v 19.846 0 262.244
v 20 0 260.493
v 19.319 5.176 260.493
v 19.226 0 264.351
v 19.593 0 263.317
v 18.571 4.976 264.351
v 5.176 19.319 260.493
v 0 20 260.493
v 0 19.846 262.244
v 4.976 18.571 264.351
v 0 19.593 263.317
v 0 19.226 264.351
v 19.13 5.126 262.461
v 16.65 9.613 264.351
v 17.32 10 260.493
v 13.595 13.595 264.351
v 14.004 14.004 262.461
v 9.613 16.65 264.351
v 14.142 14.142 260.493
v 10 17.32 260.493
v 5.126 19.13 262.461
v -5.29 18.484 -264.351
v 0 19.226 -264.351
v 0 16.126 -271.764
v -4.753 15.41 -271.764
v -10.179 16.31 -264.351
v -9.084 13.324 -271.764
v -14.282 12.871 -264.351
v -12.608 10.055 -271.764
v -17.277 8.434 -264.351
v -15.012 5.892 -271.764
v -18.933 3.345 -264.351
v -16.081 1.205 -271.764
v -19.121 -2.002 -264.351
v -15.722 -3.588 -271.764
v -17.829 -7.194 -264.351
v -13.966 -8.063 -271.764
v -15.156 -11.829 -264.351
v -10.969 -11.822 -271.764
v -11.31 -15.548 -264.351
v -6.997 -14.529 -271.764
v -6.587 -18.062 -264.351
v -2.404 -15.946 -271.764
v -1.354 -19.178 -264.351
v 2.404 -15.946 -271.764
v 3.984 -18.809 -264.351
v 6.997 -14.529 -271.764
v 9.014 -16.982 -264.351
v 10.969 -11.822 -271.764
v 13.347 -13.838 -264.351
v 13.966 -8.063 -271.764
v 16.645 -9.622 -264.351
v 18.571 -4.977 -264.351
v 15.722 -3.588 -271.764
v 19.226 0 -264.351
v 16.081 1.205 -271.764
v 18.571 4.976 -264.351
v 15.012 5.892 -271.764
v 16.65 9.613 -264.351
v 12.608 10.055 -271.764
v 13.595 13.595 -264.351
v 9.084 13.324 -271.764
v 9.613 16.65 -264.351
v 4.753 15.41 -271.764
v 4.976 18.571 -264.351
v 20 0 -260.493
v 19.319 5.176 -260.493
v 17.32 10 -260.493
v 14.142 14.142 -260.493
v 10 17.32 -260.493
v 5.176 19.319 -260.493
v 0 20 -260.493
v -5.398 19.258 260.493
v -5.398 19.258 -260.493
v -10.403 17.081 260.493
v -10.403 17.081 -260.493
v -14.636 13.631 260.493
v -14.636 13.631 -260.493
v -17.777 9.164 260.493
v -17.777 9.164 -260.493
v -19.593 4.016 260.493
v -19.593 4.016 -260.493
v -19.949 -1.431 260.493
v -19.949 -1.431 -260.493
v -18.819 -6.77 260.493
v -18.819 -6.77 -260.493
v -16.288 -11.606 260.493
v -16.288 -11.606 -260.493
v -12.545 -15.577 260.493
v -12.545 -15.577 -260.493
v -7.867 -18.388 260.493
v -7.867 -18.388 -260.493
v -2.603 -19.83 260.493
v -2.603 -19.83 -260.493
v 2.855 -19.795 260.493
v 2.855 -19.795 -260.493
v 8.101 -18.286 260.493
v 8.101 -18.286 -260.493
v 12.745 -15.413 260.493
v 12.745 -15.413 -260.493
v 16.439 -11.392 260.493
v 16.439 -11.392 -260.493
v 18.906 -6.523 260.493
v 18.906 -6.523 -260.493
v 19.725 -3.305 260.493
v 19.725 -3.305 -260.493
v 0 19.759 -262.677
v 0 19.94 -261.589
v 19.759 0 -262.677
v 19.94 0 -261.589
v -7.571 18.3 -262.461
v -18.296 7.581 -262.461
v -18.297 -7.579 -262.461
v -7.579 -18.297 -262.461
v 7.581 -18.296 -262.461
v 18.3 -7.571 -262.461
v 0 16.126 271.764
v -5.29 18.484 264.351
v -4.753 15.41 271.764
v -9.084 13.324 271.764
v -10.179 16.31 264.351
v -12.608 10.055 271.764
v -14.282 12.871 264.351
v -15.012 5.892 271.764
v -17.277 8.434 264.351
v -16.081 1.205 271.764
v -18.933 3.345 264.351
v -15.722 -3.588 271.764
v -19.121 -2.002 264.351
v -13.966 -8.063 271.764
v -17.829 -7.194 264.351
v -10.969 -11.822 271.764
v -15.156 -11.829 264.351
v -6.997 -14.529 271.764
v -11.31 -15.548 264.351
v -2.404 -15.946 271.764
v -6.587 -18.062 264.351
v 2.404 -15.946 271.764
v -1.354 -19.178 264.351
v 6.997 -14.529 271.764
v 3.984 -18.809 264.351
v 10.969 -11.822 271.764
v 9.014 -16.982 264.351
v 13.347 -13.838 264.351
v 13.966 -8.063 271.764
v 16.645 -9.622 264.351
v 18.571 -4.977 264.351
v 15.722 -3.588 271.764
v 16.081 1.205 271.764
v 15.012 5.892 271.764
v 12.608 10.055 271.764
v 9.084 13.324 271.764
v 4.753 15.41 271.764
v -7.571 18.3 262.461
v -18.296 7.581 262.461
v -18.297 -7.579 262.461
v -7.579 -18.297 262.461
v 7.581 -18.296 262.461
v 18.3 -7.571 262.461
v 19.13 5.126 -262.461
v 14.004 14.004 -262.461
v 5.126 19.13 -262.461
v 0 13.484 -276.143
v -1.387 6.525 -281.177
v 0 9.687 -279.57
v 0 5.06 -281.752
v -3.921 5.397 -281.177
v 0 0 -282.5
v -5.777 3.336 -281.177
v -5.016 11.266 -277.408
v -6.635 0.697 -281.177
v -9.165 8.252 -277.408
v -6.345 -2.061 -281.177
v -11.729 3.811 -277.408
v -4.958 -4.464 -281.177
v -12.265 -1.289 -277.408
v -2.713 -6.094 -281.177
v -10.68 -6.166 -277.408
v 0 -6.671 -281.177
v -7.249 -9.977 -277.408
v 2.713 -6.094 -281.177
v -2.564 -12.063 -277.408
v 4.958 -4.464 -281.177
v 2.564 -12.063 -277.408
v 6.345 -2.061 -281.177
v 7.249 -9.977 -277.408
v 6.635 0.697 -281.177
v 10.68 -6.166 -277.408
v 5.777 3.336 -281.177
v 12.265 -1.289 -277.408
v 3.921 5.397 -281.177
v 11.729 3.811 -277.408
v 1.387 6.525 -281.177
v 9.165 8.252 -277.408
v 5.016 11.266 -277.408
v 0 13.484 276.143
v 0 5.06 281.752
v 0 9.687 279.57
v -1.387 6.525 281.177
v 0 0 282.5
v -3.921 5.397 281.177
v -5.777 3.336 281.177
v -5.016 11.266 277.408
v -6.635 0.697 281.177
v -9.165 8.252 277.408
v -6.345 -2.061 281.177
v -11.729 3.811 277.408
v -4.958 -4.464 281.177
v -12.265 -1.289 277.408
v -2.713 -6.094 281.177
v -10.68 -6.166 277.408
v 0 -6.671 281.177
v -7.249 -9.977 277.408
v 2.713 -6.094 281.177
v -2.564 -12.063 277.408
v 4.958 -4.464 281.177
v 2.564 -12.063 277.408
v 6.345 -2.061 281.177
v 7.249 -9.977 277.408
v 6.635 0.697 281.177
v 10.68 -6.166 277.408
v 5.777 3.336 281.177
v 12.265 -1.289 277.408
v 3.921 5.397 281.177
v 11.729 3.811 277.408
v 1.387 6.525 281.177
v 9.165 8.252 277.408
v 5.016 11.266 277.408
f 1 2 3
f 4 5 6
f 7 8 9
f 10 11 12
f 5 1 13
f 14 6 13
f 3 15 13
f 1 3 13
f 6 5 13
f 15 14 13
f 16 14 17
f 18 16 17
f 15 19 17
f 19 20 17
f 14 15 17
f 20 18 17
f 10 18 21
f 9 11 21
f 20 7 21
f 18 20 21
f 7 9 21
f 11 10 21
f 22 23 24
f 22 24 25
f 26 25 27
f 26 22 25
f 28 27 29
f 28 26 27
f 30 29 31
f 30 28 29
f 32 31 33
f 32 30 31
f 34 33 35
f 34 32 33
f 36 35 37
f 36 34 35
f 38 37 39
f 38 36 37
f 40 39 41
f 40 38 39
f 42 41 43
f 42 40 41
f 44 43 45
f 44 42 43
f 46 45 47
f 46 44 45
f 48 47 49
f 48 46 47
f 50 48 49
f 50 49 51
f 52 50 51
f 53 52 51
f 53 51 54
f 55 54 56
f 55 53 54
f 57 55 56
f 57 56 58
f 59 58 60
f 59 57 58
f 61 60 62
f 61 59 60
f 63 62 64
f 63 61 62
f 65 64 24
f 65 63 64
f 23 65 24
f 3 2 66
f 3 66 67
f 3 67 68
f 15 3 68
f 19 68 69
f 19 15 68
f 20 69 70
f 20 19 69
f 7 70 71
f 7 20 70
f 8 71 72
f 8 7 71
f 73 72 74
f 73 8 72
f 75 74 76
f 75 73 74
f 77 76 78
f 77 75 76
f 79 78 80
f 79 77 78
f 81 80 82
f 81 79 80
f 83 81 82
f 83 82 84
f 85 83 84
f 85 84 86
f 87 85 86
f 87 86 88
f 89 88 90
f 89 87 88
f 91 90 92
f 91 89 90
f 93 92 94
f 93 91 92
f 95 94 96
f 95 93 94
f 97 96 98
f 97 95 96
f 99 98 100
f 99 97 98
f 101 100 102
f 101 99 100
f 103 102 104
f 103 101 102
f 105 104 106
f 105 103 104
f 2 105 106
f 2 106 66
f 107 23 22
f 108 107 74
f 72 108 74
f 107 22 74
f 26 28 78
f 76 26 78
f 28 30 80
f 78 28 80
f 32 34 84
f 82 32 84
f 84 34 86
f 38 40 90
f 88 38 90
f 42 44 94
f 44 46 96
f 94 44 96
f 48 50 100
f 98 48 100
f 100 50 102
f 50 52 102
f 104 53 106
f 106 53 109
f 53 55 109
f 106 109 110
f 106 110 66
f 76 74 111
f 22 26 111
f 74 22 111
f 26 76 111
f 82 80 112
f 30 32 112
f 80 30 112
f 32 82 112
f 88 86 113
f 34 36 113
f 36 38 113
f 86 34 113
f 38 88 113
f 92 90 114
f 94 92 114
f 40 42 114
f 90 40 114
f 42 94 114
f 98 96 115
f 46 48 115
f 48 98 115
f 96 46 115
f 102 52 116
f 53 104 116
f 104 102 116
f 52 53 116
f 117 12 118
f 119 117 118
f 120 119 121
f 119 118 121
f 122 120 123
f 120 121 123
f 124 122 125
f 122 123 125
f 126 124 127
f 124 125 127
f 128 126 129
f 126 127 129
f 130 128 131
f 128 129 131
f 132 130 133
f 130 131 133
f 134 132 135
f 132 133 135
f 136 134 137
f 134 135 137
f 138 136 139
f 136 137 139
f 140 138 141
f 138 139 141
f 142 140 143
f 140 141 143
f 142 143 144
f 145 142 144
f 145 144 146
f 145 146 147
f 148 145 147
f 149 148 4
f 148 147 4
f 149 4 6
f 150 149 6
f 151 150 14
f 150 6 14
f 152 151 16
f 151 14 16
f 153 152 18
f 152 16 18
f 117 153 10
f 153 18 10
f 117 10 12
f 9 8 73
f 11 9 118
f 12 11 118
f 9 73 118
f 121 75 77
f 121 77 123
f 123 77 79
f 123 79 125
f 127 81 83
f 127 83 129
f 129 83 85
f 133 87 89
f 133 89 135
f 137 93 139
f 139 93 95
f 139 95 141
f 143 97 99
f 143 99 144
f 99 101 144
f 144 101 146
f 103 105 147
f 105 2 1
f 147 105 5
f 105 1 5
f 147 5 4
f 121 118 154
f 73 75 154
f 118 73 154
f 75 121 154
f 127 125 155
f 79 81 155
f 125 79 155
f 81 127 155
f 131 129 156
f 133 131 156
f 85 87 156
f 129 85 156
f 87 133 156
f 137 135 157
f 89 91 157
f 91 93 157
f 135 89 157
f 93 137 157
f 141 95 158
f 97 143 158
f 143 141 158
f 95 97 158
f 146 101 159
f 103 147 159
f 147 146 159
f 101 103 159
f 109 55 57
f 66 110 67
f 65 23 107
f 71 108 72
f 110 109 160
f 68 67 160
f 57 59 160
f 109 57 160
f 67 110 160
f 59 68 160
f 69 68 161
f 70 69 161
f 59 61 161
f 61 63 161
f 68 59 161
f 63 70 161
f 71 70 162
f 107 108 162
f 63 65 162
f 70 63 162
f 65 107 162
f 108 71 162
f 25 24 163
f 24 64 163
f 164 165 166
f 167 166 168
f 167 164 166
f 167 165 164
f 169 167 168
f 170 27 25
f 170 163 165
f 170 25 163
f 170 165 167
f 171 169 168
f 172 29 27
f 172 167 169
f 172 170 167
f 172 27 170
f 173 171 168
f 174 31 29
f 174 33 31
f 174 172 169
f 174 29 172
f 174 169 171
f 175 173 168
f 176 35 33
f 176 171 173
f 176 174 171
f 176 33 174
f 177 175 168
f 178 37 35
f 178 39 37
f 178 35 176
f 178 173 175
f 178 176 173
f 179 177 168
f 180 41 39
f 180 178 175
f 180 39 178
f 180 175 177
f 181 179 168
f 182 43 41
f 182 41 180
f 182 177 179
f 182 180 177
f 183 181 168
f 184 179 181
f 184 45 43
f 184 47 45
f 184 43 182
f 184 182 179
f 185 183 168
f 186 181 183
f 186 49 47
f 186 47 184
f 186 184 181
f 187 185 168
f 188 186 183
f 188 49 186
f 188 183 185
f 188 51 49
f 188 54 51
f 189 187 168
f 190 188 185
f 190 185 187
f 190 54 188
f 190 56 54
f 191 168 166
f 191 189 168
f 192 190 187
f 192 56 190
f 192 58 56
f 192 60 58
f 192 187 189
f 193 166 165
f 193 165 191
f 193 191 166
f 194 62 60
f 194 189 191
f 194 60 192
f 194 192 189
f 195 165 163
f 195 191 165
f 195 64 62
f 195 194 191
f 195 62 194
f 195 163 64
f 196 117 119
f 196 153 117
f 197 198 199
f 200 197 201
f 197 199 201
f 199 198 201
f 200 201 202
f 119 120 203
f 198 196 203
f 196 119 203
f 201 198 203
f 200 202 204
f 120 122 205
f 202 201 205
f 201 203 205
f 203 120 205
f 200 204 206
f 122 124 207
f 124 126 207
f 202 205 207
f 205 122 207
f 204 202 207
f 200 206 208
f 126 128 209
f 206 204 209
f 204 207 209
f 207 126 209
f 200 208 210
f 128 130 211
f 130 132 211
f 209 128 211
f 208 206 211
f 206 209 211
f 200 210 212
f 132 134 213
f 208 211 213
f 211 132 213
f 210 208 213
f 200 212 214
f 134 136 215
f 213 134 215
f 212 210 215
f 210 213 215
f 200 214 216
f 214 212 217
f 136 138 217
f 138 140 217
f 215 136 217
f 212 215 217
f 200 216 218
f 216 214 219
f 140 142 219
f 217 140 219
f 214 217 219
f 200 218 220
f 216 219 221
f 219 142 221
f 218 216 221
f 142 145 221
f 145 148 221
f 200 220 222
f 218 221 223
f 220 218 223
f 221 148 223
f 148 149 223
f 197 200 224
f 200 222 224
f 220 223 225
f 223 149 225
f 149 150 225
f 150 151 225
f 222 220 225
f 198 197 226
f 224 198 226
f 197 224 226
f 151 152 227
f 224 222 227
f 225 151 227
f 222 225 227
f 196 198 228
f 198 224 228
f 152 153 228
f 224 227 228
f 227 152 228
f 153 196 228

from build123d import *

# Parameters (mm, degrees)
SKETCH1_R           = 20
BOSS_EXTRUDE1_DEPTH = 262.5
FILLET1_R           = 10


with BuildPart() as part:
    # Sketch1 → Boss-Extrude1 (new body, symmetric)
    with BuildSketch(Plane.XY):
        Circle(SKETCH1_R)
    extrude(amount=BOSS_EXTRUDE1_DEPTH, both=True)

    # Sketch2 → Revolve1 (revolve)
    with BuildSketch(Plane(origin=(0, 0, 0), x_dir=(0, 0, -1), z_dir=(1, 0, 0))):
        with BuildLine():
            Line((-262.5, 20), (-262.5, 0))
            Line((-262.5, 0), (-282.5, 0))
            ThreePointArc((-282.5, 0), (-279.57043003, 9.686707526), (-271.763715382, 16.126419422))
            Line((-271.763715382, 16.126419422), (-262.5, 20))
        make_face()
    revolve1 = revolve(axis=Axis((0, 0, 262.5), (0, 0, 1)))

    # Mirror1: Revolve1 across plane
    add(revolve1.mirror(Plane.XY))

    # Fillet1
    fillet1_edges = [part.edges().sort_by_distance(p)[0] for p in [
        (14.142135624, 14.142135624, 262.5),
        (-14.142135624, -14.142135624, -262.5),
    ]]
    fillet(fillet1_edges, radius=FILLET1_R)


solid = part.part
